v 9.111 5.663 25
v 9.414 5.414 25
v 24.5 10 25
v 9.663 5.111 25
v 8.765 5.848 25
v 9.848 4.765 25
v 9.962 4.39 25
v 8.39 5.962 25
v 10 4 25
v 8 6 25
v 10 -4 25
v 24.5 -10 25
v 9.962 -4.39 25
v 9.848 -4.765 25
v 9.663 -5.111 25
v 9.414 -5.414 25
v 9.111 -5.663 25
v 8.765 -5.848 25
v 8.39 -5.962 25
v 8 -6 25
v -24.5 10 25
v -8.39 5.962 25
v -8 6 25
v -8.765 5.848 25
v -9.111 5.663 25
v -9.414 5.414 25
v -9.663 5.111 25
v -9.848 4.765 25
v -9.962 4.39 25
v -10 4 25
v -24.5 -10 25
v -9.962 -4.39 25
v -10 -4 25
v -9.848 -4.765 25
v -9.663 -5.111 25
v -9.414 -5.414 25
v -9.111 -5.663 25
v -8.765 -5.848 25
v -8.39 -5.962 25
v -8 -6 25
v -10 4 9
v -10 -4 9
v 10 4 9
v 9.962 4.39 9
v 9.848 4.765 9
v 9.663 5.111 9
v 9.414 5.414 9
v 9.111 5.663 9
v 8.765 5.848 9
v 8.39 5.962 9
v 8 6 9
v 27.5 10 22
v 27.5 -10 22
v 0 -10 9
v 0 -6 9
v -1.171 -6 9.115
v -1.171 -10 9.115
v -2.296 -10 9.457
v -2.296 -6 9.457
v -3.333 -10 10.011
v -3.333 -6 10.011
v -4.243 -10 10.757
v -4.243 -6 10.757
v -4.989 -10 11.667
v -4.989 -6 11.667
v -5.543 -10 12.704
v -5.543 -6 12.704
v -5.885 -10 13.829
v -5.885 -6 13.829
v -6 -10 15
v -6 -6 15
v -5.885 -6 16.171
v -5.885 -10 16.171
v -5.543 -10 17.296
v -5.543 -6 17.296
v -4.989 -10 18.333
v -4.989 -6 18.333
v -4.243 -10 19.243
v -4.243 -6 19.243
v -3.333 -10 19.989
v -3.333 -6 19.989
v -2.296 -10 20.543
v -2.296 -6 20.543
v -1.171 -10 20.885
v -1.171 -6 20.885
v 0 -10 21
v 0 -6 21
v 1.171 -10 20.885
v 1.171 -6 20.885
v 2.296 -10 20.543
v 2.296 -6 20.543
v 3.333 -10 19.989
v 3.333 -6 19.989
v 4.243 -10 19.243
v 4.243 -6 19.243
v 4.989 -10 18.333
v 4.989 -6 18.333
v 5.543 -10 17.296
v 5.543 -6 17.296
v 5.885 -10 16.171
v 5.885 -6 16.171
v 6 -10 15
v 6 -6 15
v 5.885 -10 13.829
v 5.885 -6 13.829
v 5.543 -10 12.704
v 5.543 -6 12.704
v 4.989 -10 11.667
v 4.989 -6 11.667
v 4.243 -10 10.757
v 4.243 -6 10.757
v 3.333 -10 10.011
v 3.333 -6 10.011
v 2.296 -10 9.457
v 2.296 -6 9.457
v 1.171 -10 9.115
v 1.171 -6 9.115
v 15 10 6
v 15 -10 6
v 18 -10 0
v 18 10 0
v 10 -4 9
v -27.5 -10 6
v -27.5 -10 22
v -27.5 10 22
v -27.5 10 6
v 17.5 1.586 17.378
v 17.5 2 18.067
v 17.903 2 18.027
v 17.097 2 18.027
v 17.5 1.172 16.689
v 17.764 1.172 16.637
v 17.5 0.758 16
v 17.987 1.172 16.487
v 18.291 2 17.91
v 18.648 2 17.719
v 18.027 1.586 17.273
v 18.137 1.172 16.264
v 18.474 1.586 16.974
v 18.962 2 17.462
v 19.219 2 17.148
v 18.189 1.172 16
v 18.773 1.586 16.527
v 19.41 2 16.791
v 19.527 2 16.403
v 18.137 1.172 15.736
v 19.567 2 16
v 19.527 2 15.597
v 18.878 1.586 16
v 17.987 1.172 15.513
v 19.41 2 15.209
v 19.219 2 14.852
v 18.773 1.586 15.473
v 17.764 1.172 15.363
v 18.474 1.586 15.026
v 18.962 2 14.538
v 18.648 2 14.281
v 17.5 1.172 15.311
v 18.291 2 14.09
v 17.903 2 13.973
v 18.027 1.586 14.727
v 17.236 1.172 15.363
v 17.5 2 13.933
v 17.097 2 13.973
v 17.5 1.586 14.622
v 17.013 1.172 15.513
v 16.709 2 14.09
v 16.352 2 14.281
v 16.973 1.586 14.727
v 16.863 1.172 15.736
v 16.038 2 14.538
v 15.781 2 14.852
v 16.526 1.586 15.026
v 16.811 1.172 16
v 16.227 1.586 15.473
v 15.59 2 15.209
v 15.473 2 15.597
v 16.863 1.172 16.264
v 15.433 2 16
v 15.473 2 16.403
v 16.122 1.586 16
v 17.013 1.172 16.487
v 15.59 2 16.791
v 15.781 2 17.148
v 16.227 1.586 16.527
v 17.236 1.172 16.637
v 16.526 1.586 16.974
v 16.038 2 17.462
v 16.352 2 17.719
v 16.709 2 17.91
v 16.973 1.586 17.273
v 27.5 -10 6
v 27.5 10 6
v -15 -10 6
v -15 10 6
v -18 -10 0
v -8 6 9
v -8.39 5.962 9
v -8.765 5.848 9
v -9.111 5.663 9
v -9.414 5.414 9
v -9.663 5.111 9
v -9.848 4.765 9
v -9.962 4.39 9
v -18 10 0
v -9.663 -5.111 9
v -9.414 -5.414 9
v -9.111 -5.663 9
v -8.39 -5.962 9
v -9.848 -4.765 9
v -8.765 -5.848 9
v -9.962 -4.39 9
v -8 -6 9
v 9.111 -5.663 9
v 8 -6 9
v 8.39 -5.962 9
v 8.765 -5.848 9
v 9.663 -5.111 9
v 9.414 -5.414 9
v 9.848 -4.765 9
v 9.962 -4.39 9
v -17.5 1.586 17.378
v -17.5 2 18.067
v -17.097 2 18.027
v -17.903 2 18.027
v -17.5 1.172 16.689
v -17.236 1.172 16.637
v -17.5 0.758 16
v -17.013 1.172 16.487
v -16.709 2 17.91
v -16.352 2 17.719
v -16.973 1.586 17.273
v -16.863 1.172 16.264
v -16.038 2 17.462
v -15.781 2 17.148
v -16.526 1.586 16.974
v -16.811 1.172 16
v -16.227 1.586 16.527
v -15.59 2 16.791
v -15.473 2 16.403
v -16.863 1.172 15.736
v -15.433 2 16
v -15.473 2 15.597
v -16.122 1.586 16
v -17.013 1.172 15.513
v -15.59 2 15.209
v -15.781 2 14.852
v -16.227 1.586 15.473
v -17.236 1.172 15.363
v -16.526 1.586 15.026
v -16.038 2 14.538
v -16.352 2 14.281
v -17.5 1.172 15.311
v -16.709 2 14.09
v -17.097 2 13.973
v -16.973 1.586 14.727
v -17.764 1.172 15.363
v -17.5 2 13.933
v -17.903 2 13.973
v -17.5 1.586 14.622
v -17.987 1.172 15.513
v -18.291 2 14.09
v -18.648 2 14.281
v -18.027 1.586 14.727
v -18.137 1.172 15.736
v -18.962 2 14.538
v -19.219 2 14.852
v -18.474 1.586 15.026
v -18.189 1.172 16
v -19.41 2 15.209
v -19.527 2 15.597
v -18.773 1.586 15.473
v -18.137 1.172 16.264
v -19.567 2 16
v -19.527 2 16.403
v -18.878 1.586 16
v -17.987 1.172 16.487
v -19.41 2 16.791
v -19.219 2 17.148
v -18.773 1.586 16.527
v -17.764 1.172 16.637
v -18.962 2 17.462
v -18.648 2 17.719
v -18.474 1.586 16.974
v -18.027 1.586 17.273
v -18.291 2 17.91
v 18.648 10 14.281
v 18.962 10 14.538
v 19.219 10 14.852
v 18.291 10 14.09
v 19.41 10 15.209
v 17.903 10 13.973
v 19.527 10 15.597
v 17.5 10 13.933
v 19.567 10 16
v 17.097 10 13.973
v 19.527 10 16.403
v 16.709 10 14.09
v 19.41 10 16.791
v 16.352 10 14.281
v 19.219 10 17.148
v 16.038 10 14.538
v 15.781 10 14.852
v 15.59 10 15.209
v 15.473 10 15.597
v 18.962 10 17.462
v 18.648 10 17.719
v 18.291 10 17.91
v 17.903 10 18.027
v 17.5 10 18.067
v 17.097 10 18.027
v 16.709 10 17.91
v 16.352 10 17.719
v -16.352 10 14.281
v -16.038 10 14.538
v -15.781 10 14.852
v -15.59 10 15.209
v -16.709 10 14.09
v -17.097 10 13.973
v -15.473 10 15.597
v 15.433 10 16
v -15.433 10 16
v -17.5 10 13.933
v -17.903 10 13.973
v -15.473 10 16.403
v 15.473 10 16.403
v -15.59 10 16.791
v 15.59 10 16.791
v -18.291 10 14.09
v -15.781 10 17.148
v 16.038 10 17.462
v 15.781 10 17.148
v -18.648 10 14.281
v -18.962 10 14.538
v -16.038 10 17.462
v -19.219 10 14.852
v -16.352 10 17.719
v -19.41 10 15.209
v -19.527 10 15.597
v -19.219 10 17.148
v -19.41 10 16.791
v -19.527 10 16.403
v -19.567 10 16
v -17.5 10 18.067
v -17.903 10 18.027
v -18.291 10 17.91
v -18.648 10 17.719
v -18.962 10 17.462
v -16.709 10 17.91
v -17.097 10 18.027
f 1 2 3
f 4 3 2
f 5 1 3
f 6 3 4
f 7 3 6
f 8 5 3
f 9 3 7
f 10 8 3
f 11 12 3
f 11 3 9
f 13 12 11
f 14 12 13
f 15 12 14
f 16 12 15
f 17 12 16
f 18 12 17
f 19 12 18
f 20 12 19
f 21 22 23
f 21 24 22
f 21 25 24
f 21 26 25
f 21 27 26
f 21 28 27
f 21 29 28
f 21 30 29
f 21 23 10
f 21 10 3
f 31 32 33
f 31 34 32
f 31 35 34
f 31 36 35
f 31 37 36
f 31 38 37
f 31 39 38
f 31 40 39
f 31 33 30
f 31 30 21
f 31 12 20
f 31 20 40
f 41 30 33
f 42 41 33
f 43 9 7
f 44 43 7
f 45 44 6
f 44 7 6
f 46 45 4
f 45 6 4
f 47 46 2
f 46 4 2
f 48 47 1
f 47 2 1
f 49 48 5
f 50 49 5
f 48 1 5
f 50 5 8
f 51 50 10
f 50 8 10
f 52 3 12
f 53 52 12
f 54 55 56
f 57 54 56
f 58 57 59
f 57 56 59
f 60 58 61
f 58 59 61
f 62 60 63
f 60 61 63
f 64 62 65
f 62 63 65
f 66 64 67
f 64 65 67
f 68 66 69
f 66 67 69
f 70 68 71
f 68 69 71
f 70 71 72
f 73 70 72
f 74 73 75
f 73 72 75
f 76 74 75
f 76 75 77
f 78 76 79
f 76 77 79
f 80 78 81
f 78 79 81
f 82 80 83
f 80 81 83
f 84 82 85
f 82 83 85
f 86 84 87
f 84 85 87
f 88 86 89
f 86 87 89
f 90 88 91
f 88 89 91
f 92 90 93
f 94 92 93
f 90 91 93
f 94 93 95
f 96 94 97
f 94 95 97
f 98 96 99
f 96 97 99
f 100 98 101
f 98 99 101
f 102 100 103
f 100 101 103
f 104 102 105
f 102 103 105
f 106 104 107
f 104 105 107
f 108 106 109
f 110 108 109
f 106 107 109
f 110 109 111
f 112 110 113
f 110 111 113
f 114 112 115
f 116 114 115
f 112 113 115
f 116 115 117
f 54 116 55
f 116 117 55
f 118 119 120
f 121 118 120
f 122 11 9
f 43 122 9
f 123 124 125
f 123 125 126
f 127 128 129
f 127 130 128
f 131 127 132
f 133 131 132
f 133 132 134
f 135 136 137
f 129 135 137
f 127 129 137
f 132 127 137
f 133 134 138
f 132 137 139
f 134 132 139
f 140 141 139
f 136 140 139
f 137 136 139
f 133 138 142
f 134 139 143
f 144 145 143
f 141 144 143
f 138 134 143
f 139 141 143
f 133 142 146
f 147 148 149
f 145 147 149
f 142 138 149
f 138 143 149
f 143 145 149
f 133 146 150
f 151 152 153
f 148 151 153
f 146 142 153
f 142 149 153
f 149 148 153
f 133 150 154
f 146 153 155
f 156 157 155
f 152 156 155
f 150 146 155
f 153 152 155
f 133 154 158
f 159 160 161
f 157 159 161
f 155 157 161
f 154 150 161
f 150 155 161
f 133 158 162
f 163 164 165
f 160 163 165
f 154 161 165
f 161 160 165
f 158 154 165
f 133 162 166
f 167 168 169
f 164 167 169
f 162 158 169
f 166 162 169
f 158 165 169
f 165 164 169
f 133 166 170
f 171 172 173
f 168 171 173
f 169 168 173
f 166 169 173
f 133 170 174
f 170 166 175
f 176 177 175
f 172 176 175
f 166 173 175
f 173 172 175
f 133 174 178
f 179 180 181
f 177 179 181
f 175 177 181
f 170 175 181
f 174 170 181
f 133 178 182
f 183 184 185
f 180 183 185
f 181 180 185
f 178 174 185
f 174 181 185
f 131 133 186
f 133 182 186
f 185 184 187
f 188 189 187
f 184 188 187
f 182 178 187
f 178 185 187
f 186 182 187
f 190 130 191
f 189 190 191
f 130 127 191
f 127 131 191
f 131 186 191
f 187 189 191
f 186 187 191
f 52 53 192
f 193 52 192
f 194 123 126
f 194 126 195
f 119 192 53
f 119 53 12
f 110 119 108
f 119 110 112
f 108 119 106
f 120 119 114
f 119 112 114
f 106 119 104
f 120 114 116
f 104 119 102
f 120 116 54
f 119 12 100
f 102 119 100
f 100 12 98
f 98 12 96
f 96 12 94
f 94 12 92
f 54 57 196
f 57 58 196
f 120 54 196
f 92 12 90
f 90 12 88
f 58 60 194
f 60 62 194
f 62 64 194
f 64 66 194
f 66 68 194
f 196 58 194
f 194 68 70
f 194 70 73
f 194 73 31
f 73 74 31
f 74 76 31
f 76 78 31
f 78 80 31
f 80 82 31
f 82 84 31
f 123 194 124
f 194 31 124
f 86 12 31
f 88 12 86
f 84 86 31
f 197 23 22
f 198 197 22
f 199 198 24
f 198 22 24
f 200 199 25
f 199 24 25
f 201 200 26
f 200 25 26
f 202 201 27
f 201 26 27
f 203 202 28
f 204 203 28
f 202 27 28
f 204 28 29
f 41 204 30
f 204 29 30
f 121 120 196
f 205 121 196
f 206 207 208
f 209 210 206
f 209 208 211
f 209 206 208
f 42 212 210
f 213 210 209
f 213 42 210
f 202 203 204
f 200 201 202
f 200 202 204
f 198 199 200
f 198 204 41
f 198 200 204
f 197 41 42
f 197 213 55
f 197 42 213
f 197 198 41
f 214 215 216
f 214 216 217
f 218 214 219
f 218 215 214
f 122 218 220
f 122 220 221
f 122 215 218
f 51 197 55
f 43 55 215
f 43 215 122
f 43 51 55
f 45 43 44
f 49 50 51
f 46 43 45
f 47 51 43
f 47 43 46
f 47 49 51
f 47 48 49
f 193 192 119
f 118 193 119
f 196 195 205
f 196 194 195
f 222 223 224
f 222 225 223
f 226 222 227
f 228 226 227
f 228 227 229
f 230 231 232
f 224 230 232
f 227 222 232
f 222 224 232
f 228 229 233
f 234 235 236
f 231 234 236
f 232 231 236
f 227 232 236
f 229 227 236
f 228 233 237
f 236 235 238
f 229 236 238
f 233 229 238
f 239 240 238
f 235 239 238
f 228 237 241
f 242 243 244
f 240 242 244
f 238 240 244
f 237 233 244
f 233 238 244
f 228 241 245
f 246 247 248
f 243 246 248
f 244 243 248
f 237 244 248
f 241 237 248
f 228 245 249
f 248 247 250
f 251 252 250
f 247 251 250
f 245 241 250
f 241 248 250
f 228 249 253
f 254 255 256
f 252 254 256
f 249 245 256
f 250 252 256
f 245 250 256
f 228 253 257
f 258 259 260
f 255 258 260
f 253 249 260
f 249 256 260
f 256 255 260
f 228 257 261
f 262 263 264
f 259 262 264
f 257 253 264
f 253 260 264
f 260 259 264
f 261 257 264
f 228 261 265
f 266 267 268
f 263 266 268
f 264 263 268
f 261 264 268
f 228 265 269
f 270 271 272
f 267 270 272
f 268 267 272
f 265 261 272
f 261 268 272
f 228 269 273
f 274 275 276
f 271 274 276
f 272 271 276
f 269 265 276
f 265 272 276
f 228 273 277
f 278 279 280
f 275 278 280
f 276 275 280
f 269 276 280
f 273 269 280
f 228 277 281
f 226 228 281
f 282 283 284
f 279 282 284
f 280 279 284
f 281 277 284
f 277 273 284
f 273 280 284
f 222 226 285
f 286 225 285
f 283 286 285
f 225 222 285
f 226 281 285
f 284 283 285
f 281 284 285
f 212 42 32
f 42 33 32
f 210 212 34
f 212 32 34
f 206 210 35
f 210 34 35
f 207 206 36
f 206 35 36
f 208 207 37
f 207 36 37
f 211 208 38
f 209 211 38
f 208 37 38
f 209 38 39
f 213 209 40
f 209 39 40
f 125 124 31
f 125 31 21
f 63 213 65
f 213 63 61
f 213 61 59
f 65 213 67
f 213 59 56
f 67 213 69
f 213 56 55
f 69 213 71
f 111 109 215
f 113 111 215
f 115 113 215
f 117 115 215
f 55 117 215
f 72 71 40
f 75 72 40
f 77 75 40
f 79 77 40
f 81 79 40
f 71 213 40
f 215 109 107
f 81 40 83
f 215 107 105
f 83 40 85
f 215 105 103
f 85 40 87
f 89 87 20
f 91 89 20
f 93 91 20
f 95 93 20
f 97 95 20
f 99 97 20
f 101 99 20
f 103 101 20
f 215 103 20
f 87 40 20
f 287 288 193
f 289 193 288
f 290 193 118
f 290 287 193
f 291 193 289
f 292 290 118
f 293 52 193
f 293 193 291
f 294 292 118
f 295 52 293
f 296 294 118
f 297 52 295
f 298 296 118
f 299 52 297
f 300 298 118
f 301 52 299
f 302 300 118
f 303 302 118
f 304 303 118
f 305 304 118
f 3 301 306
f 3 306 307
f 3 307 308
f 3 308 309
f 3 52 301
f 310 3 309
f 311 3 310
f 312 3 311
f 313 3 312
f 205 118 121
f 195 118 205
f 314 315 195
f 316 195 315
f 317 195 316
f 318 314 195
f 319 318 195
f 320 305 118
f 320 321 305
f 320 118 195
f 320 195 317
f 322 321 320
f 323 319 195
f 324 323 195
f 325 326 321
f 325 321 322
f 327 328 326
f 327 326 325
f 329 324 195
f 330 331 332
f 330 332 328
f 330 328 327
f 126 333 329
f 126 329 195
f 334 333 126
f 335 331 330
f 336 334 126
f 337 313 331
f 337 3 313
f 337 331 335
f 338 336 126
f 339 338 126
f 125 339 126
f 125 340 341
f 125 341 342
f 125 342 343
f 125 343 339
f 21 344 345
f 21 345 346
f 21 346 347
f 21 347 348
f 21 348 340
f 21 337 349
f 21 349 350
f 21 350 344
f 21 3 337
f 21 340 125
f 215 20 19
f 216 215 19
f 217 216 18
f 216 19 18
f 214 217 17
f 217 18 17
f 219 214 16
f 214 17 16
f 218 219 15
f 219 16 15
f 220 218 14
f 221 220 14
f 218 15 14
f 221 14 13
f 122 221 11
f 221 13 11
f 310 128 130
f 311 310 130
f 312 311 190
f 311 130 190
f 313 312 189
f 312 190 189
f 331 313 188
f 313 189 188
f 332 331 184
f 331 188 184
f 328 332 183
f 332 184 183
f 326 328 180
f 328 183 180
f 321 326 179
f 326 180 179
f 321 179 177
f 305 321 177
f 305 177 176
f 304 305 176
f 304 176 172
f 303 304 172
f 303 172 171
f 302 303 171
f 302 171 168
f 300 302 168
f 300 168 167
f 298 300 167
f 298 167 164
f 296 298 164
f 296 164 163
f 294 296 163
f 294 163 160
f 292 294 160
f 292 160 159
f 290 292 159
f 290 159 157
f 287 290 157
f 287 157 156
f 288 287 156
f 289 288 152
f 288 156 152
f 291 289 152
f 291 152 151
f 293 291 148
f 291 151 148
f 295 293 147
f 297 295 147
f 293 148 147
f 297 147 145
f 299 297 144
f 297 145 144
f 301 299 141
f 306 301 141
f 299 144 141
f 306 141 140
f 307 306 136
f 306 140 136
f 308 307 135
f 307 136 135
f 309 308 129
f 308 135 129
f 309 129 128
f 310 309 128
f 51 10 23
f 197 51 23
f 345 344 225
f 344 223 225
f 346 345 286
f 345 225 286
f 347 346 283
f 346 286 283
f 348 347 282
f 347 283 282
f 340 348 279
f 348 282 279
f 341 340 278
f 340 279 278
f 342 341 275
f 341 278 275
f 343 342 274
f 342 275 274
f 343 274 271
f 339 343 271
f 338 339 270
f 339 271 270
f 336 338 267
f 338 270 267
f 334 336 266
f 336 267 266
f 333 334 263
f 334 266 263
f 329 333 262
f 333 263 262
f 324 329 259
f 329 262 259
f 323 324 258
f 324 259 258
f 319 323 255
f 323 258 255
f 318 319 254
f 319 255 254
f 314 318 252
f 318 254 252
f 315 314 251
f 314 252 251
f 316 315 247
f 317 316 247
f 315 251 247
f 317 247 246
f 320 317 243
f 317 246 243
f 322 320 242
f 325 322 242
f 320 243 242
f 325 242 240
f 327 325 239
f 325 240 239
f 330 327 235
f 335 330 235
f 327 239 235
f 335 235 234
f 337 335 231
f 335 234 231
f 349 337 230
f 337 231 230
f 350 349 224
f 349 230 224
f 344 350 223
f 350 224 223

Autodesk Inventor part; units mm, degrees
ref_plane "YZ Plane" through (0, 0, 0) normal (1, 0, 0) x (0, 1, 0)
ref_plane "XZ Plane" through (0, 0, 0) normal (0, 1, 0) x (-1, 0, 0)
ref_plane "XY Plane" through (0, 0, 0) normal (0, 0, 1) x (1, 0, 0)
sketch "Sketch1" plane through (0, 0, 0) normal (0, 1, 0) x (-1, 0, 0)
  line L0 (-27.5, 6) -> (-15, 6)
  line L1 (-15, 6) -> (-18, 0)
  line L2 (-27.5, 25) -> (-27.5, 6)
  line L3 (-27.5, 25) -> (0, 25)
  line L4 (-18, 0) -> (0, 0)
  line L5 (0, -5) -> (0, 30) projected
  line L6 (38.5, 0) -> (-38.5, 0) projected
  line L7 (27.5, 6) -> (15, 6)
  line L8 (15, 6) -> (18, 0)
  line L9 (27.5, 25) -> (27.5, 6)
  line L10 (27.5, 25) -> (0, 25)
  line L11 (18, 0) -> (0, 0)
  dimension "d9" = 19
  dimension "d10" = 25
  dimension "d11" = 27.5
  dimension "d17" = 12.5
  dimension "d19" = 9.5
extrude "Extrusion1" add sketch "Sketch1" along normal mid plane 20
sketch "Sketch2" plane through (0, -10, 0) normal (0, -1, 0) x (1, 0, 0)
  line L0 (18, 0) -> (-18, 0) projected
  line L1 (-27.5, 25) -> (27.5, 25) projected
  point P0 (0, 0)
  point P1 (0, 15)
  point P2 (0, 0)
  dimension "d20" = 10
hole "Hole1" at (0, -10, 15) direction (0, 1, 0) diameter 12 depth 10
sketch "Sketch3" plane through (-27.5, 10, 25) normal (0, 0, 1) x (1, 0, 0)
  line L0 (19.5, -16) -> (35.5, -16)
  line L1 (37.5, -14) -> (37.5, -6)
  line L2 (35.5, -4) -> (19.5, -4)
  line L3 (17.5, -6) -> (17.5, -14)
  arc A0 (17.5, -14) -> (19.5, -16) centre (19.5, -14) ccw
  arc A1 (35.5, -16) -> (37.5, -14) centre (35.5, -14) ccw
  arc A2 (37.5, -6) -> (35.5, -4) centre (35.5, -6) ccw
  arc A3 (19.5, -4) -> (17.5, -6) centre (19.5, -6) ccw
  line L4 (-11, -10) -> (66, -10) construction
  line L5 (27.5, 4) -> (27.5, -24) construction
  point P0 (27.5, -10)
  point P1 (27.5, -4)
  point P2 (17.5, -10)
  dimension "d28" = 2
  dimension "d29" = 20
  dimension "d30" = 12
extrude "Extrusion2" cut sketch "Sketch3" against normal blind 16
sketch "Sketch4" plane through (0, 10, 0) normal (0, 1, 0) x (1, 0, 0)
  line L0 (27.5, -25) -> (-27.5, -25) projected
  line L1 (27.5, -6) -> (27.5, -25) projected
  line L2 (-27.5, -25) -> (-27.5, -6) projected
  point P0 (0, 0)
  point P1 (-17.5, -16)
  point P2 (17.5, -16)
  dimension "d37" = 10
  dimension "d38" = 9
  dimension "d39" = 10
hole "Hole2" at (-17.5, 10, 16) at (17.5, 10, 16) direction (0, -1, 0) diameter 4.134 depth 8 tip angle 118 thread size "M5x0.8" class "6H" standard "ANSI Metric M Profile"
chamfer "Chamfer1" distance 3 angle 45 2 edges at (27.5, 0, 25) (-27.5, 0, 25)
equation "\"d39\" = d37"
equation "\"d3\" = 0.5"
equation "\"d4\" = 25"
properties part number "Slider"
